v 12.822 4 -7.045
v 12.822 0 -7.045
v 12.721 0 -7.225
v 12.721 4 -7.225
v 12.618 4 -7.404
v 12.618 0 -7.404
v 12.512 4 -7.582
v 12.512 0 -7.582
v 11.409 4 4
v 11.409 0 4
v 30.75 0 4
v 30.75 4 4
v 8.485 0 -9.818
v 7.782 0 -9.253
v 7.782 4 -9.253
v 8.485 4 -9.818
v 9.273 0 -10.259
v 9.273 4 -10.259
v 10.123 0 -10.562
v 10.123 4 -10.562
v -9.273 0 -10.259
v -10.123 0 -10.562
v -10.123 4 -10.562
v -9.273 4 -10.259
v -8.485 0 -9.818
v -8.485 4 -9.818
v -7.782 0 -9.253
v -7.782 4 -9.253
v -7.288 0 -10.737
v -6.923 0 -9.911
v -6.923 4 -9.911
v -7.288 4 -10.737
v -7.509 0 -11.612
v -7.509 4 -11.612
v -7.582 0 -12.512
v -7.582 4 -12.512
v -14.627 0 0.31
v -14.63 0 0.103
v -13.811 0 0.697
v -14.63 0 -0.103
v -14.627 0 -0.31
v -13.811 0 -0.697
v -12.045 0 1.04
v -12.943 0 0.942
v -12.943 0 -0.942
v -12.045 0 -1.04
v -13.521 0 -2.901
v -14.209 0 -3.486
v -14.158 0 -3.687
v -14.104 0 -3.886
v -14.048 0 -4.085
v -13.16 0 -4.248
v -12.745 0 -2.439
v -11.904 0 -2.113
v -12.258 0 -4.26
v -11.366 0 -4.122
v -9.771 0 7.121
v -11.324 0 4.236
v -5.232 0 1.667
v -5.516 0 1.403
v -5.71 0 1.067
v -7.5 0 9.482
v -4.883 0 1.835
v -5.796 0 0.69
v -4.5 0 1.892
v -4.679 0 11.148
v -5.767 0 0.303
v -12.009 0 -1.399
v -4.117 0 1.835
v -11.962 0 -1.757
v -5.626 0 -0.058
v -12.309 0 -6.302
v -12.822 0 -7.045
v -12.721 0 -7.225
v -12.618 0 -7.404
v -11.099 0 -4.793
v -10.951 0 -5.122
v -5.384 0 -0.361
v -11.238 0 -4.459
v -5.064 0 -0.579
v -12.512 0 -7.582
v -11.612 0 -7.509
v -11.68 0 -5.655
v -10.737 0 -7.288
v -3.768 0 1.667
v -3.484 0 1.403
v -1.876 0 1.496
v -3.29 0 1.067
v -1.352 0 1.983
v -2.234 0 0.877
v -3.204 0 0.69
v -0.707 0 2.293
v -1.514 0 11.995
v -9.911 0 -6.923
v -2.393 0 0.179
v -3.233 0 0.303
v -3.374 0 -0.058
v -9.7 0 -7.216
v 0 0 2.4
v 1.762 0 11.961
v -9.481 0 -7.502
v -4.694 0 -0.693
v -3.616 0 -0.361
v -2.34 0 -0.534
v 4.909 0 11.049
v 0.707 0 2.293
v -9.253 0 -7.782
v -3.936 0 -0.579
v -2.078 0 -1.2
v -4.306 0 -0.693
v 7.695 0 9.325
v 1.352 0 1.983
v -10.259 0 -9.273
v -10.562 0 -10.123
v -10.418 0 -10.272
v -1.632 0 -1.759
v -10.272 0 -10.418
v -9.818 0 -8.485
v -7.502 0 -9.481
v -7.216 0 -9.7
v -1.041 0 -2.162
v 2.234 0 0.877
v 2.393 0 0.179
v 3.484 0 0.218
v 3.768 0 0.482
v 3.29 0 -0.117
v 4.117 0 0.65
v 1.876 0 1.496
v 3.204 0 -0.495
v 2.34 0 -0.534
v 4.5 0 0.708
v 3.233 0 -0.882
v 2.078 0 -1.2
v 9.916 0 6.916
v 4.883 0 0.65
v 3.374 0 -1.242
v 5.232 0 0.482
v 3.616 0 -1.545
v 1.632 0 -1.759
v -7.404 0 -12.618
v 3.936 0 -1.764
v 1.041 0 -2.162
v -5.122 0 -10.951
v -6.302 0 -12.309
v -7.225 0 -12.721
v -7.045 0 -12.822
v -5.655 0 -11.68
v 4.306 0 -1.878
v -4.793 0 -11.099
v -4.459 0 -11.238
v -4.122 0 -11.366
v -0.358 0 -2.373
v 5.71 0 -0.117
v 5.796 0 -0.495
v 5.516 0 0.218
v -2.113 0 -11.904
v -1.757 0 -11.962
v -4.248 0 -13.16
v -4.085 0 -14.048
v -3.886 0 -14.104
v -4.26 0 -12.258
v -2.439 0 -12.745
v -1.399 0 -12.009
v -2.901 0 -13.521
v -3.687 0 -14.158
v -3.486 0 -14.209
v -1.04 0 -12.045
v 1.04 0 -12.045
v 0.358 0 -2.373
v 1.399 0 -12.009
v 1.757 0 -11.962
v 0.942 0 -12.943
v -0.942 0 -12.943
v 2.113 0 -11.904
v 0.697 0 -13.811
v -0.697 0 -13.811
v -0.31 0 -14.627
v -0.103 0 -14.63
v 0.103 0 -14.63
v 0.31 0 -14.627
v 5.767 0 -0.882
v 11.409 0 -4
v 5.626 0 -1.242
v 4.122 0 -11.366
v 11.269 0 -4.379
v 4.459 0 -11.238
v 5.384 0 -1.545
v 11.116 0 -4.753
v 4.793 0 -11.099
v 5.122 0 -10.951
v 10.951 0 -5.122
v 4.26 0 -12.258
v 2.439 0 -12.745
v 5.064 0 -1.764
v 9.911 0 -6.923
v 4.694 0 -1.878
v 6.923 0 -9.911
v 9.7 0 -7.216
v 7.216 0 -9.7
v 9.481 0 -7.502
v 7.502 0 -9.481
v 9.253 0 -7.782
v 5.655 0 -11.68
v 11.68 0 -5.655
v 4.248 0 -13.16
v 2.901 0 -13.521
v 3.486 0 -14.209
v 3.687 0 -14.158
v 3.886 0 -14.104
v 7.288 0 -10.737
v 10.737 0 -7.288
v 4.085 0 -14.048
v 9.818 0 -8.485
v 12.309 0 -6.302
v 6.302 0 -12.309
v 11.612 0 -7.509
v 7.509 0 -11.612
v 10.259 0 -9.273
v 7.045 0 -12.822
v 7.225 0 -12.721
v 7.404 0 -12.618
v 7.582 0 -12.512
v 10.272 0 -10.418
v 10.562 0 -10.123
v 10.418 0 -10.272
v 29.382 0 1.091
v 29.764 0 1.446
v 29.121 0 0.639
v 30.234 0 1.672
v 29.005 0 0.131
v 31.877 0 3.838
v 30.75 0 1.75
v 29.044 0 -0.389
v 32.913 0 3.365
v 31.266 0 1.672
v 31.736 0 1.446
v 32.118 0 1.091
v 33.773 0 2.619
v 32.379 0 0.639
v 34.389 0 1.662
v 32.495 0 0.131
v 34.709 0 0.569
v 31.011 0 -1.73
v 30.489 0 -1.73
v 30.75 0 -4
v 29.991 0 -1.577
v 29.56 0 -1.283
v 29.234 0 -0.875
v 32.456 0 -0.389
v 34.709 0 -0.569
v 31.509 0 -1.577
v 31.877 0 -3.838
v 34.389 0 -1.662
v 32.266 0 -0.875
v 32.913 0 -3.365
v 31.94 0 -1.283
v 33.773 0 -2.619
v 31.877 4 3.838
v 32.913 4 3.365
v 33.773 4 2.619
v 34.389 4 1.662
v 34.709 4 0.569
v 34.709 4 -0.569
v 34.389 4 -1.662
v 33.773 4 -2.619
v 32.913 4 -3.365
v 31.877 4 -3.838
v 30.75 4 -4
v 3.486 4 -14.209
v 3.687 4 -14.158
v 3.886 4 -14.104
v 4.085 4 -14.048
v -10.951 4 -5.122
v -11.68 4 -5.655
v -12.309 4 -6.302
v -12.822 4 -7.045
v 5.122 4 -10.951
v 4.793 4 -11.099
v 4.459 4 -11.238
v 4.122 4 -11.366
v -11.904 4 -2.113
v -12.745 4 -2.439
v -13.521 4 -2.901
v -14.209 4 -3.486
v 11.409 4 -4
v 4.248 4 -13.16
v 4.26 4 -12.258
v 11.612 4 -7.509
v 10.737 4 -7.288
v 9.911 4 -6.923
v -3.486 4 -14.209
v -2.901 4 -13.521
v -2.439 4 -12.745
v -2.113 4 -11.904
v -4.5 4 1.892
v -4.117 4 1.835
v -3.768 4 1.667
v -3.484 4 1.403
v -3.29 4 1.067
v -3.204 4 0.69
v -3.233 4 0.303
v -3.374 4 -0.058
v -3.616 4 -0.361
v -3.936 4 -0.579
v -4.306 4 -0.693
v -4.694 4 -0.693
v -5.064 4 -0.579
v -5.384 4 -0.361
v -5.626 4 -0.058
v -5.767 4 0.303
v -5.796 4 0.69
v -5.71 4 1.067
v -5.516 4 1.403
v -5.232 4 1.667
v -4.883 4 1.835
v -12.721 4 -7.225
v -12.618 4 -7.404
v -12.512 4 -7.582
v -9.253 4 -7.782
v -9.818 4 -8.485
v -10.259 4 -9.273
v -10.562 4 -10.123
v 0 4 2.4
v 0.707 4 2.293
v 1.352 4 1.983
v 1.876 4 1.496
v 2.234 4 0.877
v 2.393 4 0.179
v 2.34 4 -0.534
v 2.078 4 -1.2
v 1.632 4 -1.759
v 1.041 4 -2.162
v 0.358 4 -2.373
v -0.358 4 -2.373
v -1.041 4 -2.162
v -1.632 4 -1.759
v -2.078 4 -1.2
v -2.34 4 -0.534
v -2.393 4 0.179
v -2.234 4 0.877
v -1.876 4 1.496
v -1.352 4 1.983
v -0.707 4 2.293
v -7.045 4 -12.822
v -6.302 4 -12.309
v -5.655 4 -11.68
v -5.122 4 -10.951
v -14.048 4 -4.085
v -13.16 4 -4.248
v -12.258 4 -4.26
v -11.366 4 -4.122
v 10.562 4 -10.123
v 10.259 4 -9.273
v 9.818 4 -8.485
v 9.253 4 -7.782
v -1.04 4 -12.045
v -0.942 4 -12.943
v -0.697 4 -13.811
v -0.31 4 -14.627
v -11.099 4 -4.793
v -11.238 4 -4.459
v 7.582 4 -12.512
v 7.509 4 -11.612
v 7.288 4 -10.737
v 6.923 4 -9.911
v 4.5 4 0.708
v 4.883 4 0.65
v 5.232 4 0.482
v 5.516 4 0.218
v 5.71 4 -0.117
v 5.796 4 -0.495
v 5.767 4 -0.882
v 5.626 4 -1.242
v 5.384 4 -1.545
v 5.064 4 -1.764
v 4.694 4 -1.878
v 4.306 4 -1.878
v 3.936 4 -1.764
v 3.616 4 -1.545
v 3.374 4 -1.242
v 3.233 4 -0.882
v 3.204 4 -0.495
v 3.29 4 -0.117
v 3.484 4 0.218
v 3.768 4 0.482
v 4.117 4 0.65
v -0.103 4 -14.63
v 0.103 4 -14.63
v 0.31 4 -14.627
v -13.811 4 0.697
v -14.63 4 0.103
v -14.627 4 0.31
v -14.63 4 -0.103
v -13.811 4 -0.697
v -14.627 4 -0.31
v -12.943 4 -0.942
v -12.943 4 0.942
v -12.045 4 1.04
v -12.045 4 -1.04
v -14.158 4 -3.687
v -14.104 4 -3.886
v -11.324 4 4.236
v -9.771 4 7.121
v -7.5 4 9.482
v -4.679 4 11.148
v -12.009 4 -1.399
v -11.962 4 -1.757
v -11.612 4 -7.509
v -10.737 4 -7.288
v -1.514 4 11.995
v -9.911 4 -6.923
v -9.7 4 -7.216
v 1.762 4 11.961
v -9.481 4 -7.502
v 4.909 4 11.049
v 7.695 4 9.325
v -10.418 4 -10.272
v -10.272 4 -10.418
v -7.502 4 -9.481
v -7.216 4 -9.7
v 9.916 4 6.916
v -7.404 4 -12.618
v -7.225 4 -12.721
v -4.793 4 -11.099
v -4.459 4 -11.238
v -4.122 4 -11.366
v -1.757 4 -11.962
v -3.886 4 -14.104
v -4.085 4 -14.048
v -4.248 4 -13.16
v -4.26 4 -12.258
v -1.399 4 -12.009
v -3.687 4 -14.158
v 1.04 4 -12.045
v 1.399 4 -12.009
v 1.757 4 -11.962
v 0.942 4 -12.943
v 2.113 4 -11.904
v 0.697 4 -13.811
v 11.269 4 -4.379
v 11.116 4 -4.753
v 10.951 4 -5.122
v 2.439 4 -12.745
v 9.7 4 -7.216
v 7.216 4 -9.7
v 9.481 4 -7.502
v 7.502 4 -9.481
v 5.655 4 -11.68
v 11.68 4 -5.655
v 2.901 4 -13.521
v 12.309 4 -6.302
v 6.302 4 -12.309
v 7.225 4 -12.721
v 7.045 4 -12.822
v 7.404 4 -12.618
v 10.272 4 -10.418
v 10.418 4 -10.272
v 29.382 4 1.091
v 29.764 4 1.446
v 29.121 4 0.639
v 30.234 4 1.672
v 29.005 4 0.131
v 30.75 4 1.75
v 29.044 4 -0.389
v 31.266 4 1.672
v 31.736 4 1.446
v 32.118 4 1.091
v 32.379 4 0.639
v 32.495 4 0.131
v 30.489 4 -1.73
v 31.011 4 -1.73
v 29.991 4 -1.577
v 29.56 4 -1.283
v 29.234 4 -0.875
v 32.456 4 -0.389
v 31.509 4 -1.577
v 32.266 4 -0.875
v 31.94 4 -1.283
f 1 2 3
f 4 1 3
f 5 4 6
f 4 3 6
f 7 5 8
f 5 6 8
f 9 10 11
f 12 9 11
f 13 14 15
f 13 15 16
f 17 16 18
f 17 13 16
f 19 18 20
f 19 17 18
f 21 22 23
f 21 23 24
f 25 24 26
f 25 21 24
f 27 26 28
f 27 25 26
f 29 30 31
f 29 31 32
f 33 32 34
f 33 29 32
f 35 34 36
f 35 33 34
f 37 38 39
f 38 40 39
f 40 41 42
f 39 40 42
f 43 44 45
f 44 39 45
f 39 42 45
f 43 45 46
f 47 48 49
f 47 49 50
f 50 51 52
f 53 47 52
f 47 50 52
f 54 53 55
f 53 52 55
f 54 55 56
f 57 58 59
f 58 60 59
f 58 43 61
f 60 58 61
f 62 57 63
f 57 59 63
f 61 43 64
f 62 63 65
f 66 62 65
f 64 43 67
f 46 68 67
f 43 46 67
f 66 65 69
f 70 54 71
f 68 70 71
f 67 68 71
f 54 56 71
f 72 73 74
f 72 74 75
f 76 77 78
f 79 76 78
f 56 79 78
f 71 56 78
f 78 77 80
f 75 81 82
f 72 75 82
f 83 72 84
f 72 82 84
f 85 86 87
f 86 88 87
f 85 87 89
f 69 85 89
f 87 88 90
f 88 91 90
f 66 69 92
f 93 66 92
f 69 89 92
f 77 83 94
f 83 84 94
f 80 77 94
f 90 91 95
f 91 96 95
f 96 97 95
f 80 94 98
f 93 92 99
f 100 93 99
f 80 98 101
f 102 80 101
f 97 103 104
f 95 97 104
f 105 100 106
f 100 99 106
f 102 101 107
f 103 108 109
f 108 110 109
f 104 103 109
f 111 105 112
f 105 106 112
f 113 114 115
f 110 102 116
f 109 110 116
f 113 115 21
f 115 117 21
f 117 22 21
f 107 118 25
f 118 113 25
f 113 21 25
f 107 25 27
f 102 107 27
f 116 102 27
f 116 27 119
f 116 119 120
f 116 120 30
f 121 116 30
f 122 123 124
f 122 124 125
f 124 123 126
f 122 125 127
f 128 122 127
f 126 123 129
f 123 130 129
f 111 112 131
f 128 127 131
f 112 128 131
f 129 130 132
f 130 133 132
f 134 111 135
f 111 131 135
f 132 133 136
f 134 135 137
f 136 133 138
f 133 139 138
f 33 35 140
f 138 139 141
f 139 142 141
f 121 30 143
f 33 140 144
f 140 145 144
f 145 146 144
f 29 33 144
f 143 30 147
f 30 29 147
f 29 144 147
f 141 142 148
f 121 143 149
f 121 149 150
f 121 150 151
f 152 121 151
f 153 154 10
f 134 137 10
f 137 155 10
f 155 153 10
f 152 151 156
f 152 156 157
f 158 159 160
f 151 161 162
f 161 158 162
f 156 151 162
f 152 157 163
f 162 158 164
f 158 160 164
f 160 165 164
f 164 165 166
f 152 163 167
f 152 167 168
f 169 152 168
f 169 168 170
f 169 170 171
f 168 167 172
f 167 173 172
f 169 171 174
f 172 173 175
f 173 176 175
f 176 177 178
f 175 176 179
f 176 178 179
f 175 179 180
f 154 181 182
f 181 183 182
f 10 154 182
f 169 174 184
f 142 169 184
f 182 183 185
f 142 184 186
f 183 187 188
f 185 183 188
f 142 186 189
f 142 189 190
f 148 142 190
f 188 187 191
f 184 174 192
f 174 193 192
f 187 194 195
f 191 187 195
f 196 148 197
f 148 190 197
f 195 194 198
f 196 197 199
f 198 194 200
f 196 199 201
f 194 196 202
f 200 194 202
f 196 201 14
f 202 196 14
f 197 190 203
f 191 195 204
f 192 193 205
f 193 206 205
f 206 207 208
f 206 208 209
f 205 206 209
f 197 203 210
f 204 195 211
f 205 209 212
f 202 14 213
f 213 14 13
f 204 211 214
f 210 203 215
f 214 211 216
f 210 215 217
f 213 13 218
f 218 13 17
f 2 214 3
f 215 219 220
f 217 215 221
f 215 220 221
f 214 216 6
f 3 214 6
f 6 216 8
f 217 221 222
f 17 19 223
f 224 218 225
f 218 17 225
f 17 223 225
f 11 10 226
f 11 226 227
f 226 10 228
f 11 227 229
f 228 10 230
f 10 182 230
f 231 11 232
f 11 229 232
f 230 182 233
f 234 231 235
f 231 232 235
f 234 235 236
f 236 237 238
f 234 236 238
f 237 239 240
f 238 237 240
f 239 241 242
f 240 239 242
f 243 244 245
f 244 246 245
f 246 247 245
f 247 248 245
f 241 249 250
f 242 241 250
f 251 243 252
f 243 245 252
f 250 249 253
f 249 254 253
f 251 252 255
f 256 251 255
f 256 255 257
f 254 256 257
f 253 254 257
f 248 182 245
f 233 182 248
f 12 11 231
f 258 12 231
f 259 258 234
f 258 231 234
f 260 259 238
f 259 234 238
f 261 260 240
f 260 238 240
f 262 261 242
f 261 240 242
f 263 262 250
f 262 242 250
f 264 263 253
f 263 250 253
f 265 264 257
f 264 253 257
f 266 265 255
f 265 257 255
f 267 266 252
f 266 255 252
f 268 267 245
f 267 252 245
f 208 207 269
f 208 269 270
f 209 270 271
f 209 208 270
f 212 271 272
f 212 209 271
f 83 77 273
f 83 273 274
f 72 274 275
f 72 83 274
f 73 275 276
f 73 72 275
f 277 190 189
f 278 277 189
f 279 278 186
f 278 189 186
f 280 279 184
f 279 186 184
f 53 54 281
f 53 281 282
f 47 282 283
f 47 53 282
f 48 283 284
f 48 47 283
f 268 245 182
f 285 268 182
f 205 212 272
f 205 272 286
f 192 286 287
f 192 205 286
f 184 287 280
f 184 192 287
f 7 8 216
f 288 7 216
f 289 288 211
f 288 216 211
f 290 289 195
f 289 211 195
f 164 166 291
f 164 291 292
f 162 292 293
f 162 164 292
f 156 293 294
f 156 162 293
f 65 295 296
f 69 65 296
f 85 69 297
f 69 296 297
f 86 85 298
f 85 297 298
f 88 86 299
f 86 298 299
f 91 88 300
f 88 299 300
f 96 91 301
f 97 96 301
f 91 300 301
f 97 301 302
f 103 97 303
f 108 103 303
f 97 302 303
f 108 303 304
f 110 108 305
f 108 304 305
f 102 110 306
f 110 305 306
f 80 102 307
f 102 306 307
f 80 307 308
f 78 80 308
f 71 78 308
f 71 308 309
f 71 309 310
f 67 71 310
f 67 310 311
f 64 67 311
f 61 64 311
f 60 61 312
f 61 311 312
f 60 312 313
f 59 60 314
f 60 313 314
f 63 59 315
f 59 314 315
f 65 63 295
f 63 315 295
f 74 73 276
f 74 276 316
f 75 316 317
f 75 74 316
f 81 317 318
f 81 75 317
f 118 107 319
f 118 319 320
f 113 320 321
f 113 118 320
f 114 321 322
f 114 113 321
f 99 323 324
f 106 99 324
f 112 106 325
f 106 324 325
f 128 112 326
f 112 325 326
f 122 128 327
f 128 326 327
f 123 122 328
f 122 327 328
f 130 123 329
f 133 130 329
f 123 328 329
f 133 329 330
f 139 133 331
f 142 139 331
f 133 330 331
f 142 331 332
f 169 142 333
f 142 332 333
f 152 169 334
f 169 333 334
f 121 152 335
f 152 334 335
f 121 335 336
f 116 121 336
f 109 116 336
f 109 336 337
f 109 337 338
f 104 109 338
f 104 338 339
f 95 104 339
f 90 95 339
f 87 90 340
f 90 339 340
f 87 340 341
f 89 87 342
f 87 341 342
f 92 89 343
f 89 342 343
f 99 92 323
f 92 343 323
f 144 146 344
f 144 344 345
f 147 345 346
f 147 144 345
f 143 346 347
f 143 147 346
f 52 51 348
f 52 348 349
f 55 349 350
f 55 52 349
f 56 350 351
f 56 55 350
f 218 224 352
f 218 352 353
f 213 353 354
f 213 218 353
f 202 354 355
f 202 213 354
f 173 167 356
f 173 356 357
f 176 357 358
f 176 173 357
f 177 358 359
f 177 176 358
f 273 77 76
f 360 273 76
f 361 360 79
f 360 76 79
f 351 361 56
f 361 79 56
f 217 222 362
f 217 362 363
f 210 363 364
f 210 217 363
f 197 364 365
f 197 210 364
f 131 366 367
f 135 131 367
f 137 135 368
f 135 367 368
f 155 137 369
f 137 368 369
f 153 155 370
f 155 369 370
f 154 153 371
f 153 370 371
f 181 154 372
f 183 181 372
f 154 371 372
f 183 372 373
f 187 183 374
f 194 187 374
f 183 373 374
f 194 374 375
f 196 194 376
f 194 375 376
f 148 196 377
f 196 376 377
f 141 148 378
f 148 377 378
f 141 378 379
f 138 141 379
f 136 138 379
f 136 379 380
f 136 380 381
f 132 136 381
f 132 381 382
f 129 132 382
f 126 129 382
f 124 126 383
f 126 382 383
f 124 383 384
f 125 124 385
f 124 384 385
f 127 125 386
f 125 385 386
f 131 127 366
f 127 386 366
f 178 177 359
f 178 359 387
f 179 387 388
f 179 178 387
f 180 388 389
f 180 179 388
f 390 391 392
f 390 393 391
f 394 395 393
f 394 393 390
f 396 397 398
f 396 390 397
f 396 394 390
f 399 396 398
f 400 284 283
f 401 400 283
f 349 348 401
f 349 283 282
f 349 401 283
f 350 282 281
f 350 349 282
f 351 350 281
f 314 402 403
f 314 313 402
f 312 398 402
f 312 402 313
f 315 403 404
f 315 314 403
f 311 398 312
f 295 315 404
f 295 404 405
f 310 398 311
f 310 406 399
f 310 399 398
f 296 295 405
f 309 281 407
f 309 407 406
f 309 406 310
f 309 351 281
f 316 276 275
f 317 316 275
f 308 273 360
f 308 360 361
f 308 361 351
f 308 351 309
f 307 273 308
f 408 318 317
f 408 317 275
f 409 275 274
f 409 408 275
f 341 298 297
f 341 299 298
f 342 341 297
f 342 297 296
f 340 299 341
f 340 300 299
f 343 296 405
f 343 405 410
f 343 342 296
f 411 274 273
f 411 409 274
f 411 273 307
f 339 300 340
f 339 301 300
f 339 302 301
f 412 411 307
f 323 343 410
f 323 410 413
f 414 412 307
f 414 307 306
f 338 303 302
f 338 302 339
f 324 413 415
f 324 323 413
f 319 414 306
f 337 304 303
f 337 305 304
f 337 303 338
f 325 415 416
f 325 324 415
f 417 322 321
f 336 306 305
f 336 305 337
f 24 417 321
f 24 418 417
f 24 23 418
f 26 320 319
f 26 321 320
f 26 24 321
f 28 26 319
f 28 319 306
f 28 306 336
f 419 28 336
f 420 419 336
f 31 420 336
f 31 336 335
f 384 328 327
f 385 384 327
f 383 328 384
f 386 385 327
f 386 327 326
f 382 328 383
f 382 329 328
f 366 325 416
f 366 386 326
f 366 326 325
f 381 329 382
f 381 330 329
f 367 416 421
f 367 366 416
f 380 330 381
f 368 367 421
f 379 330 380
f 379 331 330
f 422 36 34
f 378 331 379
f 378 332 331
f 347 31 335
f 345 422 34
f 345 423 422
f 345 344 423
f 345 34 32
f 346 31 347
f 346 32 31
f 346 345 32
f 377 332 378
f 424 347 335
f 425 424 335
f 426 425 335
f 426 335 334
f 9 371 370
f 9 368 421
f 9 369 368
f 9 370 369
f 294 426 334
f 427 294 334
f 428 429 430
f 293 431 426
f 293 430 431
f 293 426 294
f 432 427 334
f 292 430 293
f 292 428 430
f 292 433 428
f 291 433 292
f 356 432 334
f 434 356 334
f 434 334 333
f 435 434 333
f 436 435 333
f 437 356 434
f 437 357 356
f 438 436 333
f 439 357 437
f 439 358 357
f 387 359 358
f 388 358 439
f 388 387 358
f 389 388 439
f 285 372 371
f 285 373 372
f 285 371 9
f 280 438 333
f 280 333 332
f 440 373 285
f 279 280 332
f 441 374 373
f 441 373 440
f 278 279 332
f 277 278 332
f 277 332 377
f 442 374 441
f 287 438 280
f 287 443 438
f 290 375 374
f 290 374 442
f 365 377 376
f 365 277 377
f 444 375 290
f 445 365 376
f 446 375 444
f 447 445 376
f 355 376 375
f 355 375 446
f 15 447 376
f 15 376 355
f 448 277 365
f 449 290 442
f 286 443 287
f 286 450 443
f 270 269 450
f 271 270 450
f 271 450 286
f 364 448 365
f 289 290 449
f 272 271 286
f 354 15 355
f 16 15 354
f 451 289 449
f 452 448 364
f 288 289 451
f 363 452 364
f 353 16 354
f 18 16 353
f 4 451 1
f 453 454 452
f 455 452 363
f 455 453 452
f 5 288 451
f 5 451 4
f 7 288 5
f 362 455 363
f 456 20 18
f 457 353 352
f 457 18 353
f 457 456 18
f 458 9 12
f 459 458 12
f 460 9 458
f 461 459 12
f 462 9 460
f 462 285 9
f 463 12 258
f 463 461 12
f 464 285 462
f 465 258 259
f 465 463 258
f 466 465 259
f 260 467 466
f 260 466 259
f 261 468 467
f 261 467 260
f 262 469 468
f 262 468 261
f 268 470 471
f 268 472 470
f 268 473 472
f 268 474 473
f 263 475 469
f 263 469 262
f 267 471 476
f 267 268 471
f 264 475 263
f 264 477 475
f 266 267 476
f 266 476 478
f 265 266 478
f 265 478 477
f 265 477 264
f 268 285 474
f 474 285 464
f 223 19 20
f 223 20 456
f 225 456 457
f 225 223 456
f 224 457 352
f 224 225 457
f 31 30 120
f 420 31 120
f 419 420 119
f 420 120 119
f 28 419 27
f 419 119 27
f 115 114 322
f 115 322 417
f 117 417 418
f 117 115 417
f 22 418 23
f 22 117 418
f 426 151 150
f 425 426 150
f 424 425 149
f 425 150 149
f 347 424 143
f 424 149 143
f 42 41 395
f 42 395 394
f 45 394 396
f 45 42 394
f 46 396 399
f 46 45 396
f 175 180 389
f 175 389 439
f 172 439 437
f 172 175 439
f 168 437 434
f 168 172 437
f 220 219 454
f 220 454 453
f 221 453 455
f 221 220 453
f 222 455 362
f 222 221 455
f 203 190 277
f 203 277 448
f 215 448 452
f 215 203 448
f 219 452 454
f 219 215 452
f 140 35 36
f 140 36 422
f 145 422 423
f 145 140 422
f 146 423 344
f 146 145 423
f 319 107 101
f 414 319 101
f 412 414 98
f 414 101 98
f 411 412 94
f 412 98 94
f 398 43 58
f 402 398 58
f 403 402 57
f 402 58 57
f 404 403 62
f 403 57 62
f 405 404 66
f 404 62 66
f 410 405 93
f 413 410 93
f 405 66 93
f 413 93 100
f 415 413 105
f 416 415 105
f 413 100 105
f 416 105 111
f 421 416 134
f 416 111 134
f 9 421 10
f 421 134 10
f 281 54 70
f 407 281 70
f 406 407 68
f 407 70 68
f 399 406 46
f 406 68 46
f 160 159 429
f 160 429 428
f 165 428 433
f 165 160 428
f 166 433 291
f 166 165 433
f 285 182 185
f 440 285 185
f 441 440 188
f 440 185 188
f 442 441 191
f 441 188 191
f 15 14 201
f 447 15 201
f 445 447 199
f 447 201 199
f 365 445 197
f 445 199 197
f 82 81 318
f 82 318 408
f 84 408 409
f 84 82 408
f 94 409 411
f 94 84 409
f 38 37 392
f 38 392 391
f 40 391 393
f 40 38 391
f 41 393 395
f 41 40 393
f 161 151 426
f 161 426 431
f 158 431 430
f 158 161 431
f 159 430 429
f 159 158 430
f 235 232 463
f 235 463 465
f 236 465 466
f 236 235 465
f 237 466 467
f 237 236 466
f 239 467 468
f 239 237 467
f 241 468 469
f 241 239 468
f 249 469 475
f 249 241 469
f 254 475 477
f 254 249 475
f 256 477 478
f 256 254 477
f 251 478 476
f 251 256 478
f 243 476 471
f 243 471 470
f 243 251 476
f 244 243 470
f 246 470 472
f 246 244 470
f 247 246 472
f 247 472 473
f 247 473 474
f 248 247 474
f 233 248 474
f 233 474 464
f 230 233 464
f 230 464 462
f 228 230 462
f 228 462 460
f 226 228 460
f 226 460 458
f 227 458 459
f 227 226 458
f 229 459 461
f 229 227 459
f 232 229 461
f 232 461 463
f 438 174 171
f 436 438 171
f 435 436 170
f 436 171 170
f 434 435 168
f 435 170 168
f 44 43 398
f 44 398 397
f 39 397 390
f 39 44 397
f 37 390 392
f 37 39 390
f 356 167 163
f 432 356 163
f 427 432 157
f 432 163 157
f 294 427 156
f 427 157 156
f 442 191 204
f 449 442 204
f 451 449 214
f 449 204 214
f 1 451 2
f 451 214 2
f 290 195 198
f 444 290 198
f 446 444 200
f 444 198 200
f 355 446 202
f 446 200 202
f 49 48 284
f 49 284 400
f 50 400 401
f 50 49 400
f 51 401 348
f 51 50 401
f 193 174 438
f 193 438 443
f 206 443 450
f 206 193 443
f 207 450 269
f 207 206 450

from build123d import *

# Parameters (mm, degrees)
SKETCH1_R           = 1.75
BOSS_EXTRUDE1_DEPTH = 4
BOSS_EXTRUDE3_START = -4
BOSS_EXTRUDE3_DEPTH = 4
SKETCH4_R           = 1.3
SKETCH4_R_2         = 2.4
CUT_EXTRUDE1_DEPTH  = 4


with BuildPart() as part:
    # Sketch1 → Boss-Extrude1 (new body)
    with BuildSketch(Plane(origin=(0, 0, 0), x_dir=(1, 0, 0), z_dir=(0, 1, 0))):
        with BuildLine():
            Line((30.75, 4), (11.409123542, 4))
            ThreePointArc((11.409123542, 4), (-12.09, 0), (11.409123542, -4))
            Line((11.409123542, -4), (30.75, -4))
            ThreePointArc((30.75, -4), (34.75, 0), (30.75, 4))
        make_face()
        with Locations(Location((30.75, 0, 0), (0, 0, 270))):
            Circle(SKETCH1_R, mode=Mode.SUBTRACT)
        with Locations(Location((0, 0, 0), (0, 0, 270))):
            Circle(SKETCH1_R, mode=Mode.SUBTRACT)
    extrude(amount=BOSS_EXTRUDE1_DEPTH)

    # Sketch3 → Boss-Extrude3 (add)
    with BuildSketch(Plane(origin=(0, 4, 0), x_dir=(1, 0, 0), z_dir=(0, 1, 0)).offset(BOSS_EXTRUDE3_START)):
        with BuildLine():
            ThreePointArc((12.82210701, 7.044889767), (12.669951657, 7.315), (12.51210701, 7.581825517))
            ThreePointArc((12.51210701, 7.581825517), (11.170223244, 7.416617696), (9.911436862, 6.9232593))
            ThreePointArc((9.911436862, 6.9232593), (10.470247132, 6.045), (10.951436862, 5.12192646))
            ThreePointArc((10.951436862, 5.12192646), (12.008090957, 5.965388247), (12.82210701, 7.044889767))
        make_face()
        with BuildLine():
            ThreePointArc((-14.626715284, 0.31), (-13.382005944, 0.837867713), (-12.04518576, 1.04))
            ThreePointArc((-12.04518576, 1.04), (-12.09, 0), (-12.04518576, -1.04))
            ThreePointArc((-12.04518576, -1.04), (-13.382005944, -0.837867713), (-14.626715284, -0.31))
            ThreePointArc((-14.626715284, -0.31), (-14.63, 0), (-14.626715284, 0.31))
        make_face()
        with BuildLine():
            ThreePointArc((-14.048088143, 4.085109489), (-12.709169027, 4.272836063), (-11.365584201, 4.122086336))
            ThreePointArc((-11.365584201, 4.122086336), (-11.67804324, 3.129122255), (-11.903927815, 2.112960617))
            ThreePointArc((-11.903927815, 2.112960617), (-13.14288127, 2.654199937), (-14.208555951, 3.486235477))
            ThreePointArc((-14.208555951, 3.486235477), (-14.131494839, 3.78652263), (-14.048088143, 4.085109489))
        make_face()
        with BuildLine():
            ThreePointArc((-12.51210701, 7.581825517), (-11.170223244, 7.416617696), (-9.911436862, 6.9232593))
            ThreePointArc((-9.911436862, 6.9232593), (-10.470247132, 6.045), (-10.951436862, 5.12192646))
            ThreePointArc((-10.951436862, 5.12192646), (-12.008090957, 5.965388247), (-12.82210701, 7.044889767))
            ThreePointArc((-12.82210701, 7.044889767), (-12.669951657, 7.315), (-12.51210701, 7.581825517))
        make_face()
        with BuildLine():
            ThreePointArc((-10.123446462, 10.561852666), (-8.870045207, 10.05496909), (-7.781841479, 9.252623584))
            ThreePointArc((-7.781841479, 9.252623584), (-8.548920985, 8.548920985), (-9.252623584, 7.781841479))
            ThreePointArc((-9.252623584, 7.781841479), (-10.05496909, 8.870045207), (-10.561852666, 10.123446462))
            ThreePointArc((-10.561852666, 10.123446462), (-10.344972209, 10.344972209), (-10.123446462, 10.561852666))
        make_face()
        with BuildLine():
            ThreePointArc((-7.044889767, 12.82210701), (-5.965388247, 12.008090957), (-5.12192646, 10.951436862))
            ThreePointArc((-5.12192646, 10.951436862), (-6.045, 10.470247132), (-6.9232593, 9.911436862))
            ThreePointArc((-6.9232593, 9.911436862), (-7.416617696, 11.170223244), (-7.581825517, 12.51210701))
            ThreePointArc((-7.581825517, 12.51210701), (-7.315, 12.669951657), (-7.044889767, 12.82210701))
        make_face()
        with BuildLine():
            ThreePointArc((-3.486235477, 14.208555951), (-2.654199937, 13.14288127), (-2.112960617, 11.903927815))
            ThreePointArc((-2.112960617, 11.903927815), (-3.129122255, 11.67804324), (-4.122086336, 11.365584201))
            ThreePointArc((-4.122086336, 11.365584201), (-4.272836063, 12.709169027), (-4.085109489, 14.048088143))
            ThreePointArc((-4.085109489, 14.048088143), (-3.78652263, 14.131494839), (-3.486235477, 14.208555951))
        make_face()
        with BuildLine():
            ThreePointArc((0.31, 14.626715284), (0.837867713, 13.382005944), (1.04, 12.04518576))
            ThreePointArc((1.04, 12.04518576), (0, 12.09), (-1.04, 12.04518576))
            ThreePointArc((-1.04, 12.04518576), (-0.837867713, 13.382005944), (-0.31, 14.626715284))
            ThreePointArc((-0.31, 14.626715284), (0, 14.63), (0.31, 14.626715284))
        make_face()
        with BuildLine():
            ThreePointArc((4.085109489, 14.048088143), (4.272836063, 12.709169027), (4.122086336, 11.365584201))
            ThreePointArc((4.122086336, 11.365584201), (3.129122255, 11.67804324), (2.112960617, 11.903927815))
            ThreePointArc((2.112960617, 11.903927815), (2.654199937, 13.14288127), (3.486235477, 14.208555951))
            ThreePointArc((3.486235477, 14.208555951), (3.78652263, 14.131494839), (4.085109489, 14.048088143))
        make_face()
        with BuildLine():
            ThreePointArc((7.581825517, 12.51210701), (7.416617696, 11.170223244), (6.9232593, 9.911436862))
            ThreePointArc((6.9232593, 9.911436862), (6.045, 10.470247132), (5.12192646, 10.951436862))
            ThreePointArc((5.12192646, 10.951436862), (5.965388247, 12.008090957), (7.044889767, 12.82210701))
            ThreePointArc((7.044889767, 12.82210701), (7.315, 12.669951657), (7.581825517, 12.51210701))
        make_face()
        with BuildLine():
            ThreePointArc((10.561852666, 10.123446462), (10.05496909, 8.870045207), (9.252623584, 7.781841479))
            ThreePointArc((9.252623584, 7.781841479), (8.548920985, 8.548920985), (7.781841479, 9.252623584))
            ThreePointArc((7.781841479, 9.252623584), (8.870045207, 10.05496909), (10.123446462, 10.561852666))
            ThreePointArc((10.123446462, 10.561852666), (10.344972209, 10.344972209), (10.561852666, 10.123446462))
        make_face()
    extrude(amount=BOSS_EXTRUDE3_DEPTH)

    # Sketch4 → Cut-Extrude1 (cut)
    with BuildSketch(Plane(origin=(0, 4, 0), x_dir=(1, 0, 0), z_dir=(0, 1, 0))):
        with Locations(Location((4.5, 0.592436239, 0), (0, 0, 270))):
            Circle(SKETCH4_R)
        with Locations(Location((-4.5, -0.592436239, 0), (0, 0, 270))):
            Circle(SKETCH4_R)
        with Locations(Location((0, 0, 0), (0, 0, 270))):
            Circle(SKETCH4_R_2)
    extrude(amount=-CUT_EXTRUDE1_DEPTH, mode=Mode.SUBTRACT)


solid = part.part
